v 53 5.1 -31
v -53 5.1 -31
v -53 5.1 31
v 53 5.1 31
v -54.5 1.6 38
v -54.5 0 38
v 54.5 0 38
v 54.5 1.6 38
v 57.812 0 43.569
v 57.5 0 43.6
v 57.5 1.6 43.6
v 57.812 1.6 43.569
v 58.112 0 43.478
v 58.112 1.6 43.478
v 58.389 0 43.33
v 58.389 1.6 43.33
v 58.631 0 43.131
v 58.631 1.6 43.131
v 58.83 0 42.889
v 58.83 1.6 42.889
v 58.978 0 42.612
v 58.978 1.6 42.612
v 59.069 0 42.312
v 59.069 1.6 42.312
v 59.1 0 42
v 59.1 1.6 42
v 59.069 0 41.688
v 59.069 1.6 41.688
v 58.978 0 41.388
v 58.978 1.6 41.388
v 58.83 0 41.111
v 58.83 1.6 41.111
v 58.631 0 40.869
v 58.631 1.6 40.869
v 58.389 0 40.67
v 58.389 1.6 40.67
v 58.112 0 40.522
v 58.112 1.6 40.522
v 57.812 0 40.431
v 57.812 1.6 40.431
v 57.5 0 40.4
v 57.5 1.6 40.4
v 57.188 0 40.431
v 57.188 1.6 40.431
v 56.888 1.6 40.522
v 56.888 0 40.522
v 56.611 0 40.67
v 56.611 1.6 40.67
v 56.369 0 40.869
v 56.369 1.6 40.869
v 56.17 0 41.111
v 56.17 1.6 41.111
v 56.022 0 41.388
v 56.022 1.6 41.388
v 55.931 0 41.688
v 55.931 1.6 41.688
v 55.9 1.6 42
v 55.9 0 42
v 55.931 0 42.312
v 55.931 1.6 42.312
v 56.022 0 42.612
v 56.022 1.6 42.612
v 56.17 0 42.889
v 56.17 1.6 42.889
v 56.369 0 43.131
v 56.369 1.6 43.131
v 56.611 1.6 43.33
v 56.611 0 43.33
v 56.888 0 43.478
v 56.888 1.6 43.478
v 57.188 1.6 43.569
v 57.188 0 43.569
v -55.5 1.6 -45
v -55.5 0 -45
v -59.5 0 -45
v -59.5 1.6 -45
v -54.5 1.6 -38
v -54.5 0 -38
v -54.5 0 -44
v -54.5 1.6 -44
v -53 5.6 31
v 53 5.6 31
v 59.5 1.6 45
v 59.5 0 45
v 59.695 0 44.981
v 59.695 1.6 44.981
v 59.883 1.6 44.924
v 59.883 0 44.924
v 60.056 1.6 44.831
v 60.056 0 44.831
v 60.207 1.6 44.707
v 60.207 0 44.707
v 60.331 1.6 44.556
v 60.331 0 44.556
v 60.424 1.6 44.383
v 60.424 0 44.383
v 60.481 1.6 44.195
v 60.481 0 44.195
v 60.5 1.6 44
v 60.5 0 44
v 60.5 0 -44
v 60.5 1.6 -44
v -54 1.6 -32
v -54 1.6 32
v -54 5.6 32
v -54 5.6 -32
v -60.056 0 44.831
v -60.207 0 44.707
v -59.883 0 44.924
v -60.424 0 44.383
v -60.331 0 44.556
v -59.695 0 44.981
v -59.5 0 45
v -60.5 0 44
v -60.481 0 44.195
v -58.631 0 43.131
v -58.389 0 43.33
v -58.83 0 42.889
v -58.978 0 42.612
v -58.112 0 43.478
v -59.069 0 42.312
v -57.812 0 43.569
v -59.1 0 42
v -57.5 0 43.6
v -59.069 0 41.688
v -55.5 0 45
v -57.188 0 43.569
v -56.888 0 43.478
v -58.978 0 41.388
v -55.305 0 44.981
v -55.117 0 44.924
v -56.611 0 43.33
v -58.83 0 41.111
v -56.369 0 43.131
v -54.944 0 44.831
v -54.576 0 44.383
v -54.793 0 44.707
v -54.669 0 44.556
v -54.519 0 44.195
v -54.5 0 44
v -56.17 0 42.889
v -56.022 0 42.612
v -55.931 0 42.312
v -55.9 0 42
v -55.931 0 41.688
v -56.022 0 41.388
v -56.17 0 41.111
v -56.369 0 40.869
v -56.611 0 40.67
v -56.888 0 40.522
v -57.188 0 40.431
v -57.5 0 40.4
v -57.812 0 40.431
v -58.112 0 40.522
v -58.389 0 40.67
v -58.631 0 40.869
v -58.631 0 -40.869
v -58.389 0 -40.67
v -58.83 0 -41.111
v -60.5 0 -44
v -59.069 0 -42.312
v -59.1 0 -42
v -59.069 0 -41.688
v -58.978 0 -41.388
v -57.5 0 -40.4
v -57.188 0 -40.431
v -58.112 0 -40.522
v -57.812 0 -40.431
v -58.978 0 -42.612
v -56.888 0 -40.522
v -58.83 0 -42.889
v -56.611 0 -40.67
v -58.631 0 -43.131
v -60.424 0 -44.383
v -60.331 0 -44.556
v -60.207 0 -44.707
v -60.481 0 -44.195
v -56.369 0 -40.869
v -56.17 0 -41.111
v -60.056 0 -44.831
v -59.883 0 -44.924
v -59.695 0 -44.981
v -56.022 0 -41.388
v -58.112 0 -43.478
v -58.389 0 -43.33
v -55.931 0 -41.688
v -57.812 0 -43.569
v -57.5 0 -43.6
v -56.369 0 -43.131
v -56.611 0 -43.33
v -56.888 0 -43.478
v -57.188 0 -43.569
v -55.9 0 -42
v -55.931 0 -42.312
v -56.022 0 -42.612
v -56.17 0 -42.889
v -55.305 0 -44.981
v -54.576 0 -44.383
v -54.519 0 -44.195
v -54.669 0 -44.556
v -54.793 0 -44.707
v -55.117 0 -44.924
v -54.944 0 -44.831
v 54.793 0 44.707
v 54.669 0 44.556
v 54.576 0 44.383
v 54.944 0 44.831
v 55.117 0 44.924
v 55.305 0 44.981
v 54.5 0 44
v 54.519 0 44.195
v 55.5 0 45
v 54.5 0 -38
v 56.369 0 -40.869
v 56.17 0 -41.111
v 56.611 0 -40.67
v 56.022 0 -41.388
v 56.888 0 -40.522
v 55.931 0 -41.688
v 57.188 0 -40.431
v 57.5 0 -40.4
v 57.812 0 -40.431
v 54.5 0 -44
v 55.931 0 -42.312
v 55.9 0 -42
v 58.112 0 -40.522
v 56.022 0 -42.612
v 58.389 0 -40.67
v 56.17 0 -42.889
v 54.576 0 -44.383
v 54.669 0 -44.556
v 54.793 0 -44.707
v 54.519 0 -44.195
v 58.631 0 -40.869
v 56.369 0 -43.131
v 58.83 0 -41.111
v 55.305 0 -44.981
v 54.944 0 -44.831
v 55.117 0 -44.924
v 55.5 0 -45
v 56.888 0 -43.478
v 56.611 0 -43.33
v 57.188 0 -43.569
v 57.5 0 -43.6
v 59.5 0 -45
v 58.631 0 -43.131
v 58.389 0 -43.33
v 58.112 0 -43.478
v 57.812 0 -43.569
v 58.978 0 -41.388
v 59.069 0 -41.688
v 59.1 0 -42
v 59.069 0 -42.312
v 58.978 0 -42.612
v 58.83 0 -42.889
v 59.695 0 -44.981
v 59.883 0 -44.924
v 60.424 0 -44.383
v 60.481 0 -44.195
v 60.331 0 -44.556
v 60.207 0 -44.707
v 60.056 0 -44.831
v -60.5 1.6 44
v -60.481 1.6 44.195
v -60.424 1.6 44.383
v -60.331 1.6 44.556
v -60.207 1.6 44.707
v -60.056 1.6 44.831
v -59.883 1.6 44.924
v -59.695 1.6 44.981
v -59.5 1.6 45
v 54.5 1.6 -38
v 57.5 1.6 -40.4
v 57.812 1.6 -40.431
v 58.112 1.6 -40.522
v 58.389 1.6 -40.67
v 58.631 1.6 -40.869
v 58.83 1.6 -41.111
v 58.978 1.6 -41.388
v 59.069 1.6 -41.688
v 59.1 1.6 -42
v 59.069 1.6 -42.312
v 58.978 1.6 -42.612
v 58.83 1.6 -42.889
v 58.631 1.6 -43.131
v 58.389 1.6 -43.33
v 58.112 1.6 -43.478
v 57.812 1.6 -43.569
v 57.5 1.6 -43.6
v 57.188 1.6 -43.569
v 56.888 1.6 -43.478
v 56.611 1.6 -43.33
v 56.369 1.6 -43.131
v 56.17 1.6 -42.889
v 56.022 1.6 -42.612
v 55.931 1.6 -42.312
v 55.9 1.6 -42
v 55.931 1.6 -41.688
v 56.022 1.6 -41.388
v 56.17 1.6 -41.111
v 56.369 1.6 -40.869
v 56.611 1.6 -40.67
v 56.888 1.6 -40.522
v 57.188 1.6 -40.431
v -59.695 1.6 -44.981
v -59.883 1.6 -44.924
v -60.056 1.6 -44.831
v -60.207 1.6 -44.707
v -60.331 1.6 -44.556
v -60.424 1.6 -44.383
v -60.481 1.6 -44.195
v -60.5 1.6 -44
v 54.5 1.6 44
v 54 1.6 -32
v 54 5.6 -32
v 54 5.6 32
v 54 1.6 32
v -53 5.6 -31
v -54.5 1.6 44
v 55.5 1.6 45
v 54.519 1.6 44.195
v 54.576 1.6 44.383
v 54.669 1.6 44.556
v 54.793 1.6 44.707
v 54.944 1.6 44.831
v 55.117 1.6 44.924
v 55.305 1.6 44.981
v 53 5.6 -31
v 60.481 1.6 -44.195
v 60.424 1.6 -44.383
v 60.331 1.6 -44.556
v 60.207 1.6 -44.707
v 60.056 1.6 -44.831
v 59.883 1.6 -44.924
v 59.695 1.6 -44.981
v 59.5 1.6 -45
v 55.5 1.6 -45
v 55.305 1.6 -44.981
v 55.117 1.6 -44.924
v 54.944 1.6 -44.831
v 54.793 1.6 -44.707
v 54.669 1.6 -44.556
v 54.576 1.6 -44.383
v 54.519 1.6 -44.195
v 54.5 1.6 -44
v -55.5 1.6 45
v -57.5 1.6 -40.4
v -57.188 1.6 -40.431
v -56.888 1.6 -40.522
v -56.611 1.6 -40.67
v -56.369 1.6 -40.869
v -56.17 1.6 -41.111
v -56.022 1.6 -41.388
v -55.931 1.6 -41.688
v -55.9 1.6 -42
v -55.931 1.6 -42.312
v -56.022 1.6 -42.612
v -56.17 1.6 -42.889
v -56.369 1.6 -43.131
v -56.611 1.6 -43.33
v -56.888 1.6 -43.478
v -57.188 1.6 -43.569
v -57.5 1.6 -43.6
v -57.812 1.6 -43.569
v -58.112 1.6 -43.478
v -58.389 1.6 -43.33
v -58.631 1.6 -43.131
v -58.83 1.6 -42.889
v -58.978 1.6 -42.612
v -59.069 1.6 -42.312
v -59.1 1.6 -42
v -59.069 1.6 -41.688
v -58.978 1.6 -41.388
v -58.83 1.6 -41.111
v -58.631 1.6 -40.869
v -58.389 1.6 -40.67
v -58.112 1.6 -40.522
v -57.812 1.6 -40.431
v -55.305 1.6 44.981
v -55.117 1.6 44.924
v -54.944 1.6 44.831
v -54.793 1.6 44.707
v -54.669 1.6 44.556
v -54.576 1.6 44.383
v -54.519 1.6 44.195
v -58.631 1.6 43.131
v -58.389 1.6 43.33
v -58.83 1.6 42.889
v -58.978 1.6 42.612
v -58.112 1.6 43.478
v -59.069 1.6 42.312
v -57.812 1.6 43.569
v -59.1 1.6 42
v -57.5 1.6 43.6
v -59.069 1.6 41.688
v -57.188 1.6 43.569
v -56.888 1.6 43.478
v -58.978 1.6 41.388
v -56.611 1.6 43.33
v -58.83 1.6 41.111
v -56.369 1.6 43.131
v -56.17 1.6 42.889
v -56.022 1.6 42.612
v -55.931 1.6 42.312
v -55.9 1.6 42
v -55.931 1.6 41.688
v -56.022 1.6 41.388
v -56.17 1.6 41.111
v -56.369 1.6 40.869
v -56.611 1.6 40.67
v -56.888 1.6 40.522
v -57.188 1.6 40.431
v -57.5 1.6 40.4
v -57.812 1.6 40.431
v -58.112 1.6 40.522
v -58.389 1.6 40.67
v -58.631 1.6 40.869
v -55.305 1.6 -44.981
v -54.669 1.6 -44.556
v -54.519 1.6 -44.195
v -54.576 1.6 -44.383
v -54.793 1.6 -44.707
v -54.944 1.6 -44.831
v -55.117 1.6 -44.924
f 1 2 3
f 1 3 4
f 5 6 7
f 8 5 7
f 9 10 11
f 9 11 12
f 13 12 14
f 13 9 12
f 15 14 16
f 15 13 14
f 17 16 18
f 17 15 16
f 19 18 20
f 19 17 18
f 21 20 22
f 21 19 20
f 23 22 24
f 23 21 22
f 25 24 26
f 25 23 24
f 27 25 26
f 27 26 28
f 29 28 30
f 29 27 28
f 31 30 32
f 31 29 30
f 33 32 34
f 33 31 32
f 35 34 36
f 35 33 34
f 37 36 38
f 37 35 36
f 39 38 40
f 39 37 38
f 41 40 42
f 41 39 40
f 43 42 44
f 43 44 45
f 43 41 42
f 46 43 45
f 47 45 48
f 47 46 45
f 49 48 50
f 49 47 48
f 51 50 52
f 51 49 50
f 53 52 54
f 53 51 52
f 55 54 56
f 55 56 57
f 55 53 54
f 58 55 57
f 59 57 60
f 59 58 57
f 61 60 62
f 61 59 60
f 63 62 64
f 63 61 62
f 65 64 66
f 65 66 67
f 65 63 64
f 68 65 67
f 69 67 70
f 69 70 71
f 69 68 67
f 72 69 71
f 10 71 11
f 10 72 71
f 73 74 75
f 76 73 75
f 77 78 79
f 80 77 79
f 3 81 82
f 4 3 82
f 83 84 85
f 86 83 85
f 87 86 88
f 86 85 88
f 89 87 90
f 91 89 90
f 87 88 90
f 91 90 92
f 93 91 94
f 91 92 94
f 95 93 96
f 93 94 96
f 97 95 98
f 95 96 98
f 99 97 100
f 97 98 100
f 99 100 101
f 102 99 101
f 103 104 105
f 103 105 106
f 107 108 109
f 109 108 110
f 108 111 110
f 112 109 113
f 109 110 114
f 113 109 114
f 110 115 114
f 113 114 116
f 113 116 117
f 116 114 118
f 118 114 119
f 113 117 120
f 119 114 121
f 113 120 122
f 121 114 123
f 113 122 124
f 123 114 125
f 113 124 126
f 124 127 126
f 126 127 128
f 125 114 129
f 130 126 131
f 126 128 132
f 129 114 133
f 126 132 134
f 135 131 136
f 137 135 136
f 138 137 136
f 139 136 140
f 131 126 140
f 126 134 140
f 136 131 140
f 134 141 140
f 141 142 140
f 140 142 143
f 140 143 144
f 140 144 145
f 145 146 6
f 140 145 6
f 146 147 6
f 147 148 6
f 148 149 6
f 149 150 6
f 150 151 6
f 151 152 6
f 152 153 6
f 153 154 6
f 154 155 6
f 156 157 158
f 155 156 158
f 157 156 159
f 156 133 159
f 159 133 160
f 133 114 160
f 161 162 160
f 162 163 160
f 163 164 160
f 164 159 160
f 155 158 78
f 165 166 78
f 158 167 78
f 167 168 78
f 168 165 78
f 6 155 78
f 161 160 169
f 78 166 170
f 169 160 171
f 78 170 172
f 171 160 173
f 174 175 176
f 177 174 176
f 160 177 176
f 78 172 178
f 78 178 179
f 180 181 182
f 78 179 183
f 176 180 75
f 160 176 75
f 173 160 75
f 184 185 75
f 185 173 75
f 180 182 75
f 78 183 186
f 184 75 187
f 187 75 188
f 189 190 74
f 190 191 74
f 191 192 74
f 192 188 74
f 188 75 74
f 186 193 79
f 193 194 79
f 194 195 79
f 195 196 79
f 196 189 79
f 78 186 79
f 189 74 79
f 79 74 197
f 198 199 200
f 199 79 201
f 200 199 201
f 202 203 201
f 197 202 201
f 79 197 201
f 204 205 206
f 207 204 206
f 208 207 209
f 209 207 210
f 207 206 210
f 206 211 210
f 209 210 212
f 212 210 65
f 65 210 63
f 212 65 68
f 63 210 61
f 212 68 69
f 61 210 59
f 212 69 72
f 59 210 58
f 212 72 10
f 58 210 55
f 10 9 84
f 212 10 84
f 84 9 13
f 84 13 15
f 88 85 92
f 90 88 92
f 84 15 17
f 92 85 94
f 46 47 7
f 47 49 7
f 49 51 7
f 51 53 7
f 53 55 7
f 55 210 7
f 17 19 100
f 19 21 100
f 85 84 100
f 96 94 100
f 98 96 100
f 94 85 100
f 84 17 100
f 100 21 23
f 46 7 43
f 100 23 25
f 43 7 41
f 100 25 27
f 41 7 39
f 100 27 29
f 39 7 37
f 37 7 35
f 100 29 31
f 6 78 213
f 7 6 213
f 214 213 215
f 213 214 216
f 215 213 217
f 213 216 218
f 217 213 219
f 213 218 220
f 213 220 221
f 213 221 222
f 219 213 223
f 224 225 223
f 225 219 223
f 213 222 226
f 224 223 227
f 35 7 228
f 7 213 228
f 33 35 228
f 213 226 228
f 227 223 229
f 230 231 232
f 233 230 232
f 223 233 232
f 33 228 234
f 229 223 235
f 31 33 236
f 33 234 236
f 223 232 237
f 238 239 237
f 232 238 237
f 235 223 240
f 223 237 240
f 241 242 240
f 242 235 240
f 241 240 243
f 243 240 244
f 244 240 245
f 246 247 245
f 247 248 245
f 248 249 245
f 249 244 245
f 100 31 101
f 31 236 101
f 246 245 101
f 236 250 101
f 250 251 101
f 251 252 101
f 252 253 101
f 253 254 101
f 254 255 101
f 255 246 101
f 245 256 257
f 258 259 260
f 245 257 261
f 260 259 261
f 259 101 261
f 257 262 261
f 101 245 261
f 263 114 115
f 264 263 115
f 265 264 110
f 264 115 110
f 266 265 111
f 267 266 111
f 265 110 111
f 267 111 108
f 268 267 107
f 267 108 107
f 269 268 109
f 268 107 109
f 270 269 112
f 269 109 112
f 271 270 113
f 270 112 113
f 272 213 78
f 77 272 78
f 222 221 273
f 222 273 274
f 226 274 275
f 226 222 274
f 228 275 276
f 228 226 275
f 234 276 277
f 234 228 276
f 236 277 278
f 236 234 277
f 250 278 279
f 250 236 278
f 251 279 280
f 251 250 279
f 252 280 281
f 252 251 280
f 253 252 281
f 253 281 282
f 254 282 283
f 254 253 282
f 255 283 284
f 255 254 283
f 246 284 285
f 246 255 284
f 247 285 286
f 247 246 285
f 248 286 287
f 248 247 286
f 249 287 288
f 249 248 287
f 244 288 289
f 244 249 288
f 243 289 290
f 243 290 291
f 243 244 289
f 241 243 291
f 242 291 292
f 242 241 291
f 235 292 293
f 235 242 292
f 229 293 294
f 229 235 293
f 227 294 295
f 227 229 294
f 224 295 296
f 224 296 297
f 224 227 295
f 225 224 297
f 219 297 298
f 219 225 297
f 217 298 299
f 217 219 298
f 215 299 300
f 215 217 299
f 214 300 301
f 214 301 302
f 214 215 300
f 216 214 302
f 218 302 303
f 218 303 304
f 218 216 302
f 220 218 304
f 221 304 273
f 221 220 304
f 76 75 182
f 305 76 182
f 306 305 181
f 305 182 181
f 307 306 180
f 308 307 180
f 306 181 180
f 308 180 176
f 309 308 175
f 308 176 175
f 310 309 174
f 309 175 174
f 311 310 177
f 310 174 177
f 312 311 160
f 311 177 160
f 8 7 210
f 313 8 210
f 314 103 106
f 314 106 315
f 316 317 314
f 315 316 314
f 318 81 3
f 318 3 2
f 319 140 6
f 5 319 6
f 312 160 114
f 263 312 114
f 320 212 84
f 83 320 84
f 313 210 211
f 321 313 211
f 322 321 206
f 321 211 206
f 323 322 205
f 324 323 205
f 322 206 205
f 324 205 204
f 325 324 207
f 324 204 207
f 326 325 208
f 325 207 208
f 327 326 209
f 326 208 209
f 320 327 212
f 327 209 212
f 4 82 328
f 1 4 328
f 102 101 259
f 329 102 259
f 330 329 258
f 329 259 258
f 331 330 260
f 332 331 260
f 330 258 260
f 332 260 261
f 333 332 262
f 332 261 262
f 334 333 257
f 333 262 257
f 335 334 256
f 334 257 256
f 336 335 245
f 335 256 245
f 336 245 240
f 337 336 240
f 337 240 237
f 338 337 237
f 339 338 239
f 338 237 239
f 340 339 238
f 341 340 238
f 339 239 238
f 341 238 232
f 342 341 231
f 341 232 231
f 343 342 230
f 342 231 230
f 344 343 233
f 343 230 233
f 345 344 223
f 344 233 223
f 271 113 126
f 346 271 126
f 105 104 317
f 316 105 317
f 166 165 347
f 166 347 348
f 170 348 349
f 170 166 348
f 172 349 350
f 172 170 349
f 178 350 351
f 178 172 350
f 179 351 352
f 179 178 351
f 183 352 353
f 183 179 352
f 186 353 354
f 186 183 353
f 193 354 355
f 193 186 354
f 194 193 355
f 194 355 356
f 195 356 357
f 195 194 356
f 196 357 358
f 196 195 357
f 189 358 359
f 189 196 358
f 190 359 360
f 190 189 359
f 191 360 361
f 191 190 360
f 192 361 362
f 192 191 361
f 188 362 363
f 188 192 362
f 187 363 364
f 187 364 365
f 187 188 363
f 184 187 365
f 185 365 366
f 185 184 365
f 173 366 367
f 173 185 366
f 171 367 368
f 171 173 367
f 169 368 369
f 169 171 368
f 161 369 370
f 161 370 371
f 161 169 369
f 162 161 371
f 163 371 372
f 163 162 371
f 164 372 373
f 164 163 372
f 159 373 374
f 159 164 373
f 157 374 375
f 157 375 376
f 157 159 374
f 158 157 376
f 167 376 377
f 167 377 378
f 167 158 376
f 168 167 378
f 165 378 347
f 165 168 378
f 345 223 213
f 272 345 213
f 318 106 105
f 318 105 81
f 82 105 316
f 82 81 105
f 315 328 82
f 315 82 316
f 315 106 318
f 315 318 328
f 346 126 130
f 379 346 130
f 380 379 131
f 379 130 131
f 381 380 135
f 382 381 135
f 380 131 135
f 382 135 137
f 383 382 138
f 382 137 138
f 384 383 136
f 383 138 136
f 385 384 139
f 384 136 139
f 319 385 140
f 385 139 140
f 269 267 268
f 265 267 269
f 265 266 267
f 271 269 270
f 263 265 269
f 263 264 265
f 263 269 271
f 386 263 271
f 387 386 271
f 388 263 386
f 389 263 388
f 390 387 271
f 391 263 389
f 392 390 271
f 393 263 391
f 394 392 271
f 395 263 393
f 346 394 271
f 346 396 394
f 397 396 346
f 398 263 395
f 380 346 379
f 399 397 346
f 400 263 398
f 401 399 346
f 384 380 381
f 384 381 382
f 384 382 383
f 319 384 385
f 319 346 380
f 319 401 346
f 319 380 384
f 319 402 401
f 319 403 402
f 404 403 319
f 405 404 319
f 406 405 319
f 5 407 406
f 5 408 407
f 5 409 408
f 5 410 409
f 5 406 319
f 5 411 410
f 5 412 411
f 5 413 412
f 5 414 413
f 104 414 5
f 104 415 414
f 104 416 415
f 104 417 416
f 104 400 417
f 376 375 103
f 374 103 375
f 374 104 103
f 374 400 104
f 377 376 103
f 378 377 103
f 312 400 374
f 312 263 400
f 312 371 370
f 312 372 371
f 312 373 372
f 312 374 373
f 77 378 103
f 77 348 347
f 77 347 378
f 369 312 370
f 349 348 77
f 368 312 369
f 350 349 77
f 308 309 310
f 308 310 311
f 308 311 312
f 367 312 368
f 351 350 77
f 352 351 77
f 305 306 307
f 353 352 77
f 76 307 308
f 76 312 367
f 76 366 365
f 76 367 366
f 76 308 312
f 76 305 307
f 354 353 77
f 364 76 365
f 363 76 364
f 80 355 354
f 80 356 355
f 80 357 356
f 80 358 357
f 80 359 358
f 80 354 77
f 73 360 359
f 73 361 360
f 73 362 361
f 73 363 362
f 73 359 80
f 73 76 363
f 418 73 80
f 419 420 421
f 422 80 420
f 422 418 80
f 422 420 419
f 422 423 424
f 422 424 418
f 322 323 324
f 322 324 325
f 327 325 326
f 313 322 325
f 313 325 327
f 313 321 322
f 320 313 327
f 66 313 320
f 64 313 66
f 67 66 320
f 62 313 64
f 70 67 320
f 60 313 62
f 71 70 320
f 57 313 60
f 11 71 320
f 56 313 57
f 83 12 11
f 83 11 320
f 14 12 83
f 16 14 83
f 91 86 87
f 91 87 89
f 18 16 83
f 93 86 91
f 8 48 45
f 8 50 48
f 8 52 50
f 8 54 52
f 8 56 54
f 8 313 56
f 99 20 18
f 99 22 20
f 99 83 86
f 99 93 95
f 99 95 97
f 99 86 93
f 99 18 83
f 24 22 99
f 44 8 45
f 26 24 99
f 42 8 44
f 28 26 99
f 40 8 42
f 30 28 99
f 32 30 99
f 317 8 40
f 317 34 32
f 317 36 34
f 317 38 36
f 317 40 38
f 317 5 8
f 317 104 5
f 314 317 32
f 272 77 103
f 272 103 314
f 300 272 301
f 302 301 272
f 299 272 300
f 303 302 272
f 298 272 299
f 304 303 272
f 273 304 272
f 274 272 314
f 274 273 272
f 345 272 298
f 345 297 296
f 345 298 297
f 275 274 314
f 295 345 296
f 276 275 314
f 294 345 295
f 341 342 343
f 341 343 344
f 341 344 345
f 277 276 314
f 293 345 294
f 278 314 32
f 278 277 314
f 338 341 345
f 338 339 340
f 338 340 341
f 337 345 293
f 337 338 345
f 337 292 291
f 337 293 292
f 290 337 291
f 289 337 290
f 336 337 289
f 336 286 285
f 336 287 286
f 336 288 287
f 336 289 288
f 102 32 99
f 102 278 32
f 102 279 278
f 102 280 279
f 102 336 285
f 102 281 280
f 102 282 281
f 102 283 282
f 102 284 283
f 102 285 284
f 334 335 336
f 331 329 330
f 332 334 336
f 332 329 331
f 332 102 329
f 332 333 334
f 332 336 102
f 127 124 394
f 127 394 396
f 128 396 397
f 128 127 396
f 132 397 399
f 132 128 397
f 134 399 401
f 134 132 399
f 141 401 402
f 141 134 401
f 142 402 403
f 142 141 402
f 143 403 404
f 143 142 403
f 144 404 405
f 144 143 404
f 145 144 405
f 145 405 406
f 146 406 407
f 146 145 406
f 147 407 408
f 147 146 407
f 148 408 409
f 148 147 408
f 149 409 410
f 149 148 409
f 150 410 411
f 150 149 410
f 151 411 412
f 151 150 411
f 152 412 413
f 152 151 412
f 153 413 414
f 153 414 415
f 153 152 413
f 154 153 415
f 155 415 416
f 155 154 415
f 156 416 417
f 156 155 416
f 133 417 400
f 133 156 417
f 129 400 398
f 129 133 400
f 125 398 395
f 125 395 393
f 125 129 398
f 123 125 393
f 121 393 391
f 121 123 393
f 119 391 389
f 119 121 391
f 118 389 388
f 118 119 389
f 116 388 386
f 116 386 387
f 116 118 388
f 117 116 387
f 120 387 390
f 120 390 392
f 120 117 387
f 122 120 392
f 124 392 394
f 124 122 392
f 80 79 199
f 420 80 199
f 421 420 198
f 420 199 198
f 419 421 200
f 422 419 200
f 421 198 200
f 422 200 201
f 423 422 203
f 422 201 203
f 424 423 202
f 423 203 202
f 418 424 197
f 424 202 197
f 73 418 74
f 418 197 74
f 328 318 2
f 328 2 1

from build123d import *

# Parameters (mm, degrees)
SKETCH_1_R          = 1.6
EXTRUDE_1_DEPTH     = 1.6
SKETCH_2_W          = 108
SKETCH_2_H          = 64
EXTRUDE_2_DEPTH     = 4
SKETCH_3_W          = 106
SKETCH_3_H          = 62
CUT_EXTRUDE_1_DEPTH = 0.5


with BuildPart() as part:
    # 草图1 → 凸台-拉伸1 (new body)
    with BuildSketch(Plane(origin=(0, 0, 0), x_dir=(1, 0, 0), z_dir=(0, 1, 0))):
        with BuildLine():
            Line((54.5, 44), (54.5, 38))
            Line((54.5, 38), (-54.5, 38))
            Line((-54.5, 38), (-54.5, 44))
            ThreePointArc((-54.5, 44), (-54.792893219, 44.707106781), (-55.5, 45))
            Line((-55.5, 45), (-59.5, 45))
            ThreePointArc((-59.5, 45), (-60.207106781, 44.707106781), (-60.5, 44))
            Line((-60.5, 44), (-60.5, 38))
            Line((-60.5, 38), (-60.5, -38))
            Line((-60.5, -38), (-60.5, -44))
            ThreePointArc((-60.5, -44), (-60.207106781, -44.707106781), (-59.5, -45))
            Line((-59.5, -45), (-55.5, -45))
            ThreePointArc((-55.5, -45), (-54.792893219, -44.707106781), (-54.5, -44))
            Line((-54.5, -44), (-54.5, -38))
            Line((-54.5, -38), (54.5, -38))
            Line((54.5, -38), (54.5, -44))
            ThreePointArc((54.5, -44), (54.792893219, -44.707106781), (55.5, -45))
            Line((55.5, -45), (59.5, -45))
            ThreePointArc((59.5, -45), (60.207106781, -44.707106781), (60.5, -44))
            Line((60.5, -44), (60.5, 38))
            Line((60.5, 38), (60.5, 44))
            ThreePointArc((60.5, 44), (60.207106781, 44.707106781), (59.5, 45))
            Line((59.5, 45), (55.5, 45))
            ThreePointArc((55.5, 45), (54.792893219, 44.707106781), (54.5, 44))
        make_face()
        with Locations(Location((-57.5, -42, 0), (0, 0, 270))):
            Circle(SKETCH_1_R, mode=Mode.SUBTRACT)
        with Locations(Location((57.5, -42, 0), (0, 0, 270))):
            Circle(SKETCH_1_R, mode=Mode.SUBTRACT)
        with Locations(Location((-57.5, 42, 0), (0, 0, 270))):
            Circle(SKETCH_1_R, mode=Mode.SUBTRACT)
        with Locations(Location((57.5, 42, 0), (0, 0, 270))):
            Circle(SKETCH_1_R, mode=Mode.SUBTRACT)
    extrude(amount=EXTRUDE_1_DEPTH)

    # 草图2 → 凸台-拉伸2 (add)
    with BuildSketch(Plane(origin=(0, 1.6, 0), x_dir=(1, 0, 0), z_dir=(0, 1, 0))):
        Rectangle(SKETCH_2_W, SKETCH_2_H)
    extrude(amount=EXTRUDE_2_DEPTH)

    # 草图3 → 切除-拉伸1 (cut)
    with BuildSketch(Plane(origin=(0, 5.6, 0), x_dir=(1, 0, 0), z_dir=(0, 1, 0))):
        Rectangle(SKETCH_3_W, SKETCH_3_H)
    extrude(amount=-CUT_EXTRUDE_1_DEPTH, mode=Mode.SUBTRACT)


solid = part.part
